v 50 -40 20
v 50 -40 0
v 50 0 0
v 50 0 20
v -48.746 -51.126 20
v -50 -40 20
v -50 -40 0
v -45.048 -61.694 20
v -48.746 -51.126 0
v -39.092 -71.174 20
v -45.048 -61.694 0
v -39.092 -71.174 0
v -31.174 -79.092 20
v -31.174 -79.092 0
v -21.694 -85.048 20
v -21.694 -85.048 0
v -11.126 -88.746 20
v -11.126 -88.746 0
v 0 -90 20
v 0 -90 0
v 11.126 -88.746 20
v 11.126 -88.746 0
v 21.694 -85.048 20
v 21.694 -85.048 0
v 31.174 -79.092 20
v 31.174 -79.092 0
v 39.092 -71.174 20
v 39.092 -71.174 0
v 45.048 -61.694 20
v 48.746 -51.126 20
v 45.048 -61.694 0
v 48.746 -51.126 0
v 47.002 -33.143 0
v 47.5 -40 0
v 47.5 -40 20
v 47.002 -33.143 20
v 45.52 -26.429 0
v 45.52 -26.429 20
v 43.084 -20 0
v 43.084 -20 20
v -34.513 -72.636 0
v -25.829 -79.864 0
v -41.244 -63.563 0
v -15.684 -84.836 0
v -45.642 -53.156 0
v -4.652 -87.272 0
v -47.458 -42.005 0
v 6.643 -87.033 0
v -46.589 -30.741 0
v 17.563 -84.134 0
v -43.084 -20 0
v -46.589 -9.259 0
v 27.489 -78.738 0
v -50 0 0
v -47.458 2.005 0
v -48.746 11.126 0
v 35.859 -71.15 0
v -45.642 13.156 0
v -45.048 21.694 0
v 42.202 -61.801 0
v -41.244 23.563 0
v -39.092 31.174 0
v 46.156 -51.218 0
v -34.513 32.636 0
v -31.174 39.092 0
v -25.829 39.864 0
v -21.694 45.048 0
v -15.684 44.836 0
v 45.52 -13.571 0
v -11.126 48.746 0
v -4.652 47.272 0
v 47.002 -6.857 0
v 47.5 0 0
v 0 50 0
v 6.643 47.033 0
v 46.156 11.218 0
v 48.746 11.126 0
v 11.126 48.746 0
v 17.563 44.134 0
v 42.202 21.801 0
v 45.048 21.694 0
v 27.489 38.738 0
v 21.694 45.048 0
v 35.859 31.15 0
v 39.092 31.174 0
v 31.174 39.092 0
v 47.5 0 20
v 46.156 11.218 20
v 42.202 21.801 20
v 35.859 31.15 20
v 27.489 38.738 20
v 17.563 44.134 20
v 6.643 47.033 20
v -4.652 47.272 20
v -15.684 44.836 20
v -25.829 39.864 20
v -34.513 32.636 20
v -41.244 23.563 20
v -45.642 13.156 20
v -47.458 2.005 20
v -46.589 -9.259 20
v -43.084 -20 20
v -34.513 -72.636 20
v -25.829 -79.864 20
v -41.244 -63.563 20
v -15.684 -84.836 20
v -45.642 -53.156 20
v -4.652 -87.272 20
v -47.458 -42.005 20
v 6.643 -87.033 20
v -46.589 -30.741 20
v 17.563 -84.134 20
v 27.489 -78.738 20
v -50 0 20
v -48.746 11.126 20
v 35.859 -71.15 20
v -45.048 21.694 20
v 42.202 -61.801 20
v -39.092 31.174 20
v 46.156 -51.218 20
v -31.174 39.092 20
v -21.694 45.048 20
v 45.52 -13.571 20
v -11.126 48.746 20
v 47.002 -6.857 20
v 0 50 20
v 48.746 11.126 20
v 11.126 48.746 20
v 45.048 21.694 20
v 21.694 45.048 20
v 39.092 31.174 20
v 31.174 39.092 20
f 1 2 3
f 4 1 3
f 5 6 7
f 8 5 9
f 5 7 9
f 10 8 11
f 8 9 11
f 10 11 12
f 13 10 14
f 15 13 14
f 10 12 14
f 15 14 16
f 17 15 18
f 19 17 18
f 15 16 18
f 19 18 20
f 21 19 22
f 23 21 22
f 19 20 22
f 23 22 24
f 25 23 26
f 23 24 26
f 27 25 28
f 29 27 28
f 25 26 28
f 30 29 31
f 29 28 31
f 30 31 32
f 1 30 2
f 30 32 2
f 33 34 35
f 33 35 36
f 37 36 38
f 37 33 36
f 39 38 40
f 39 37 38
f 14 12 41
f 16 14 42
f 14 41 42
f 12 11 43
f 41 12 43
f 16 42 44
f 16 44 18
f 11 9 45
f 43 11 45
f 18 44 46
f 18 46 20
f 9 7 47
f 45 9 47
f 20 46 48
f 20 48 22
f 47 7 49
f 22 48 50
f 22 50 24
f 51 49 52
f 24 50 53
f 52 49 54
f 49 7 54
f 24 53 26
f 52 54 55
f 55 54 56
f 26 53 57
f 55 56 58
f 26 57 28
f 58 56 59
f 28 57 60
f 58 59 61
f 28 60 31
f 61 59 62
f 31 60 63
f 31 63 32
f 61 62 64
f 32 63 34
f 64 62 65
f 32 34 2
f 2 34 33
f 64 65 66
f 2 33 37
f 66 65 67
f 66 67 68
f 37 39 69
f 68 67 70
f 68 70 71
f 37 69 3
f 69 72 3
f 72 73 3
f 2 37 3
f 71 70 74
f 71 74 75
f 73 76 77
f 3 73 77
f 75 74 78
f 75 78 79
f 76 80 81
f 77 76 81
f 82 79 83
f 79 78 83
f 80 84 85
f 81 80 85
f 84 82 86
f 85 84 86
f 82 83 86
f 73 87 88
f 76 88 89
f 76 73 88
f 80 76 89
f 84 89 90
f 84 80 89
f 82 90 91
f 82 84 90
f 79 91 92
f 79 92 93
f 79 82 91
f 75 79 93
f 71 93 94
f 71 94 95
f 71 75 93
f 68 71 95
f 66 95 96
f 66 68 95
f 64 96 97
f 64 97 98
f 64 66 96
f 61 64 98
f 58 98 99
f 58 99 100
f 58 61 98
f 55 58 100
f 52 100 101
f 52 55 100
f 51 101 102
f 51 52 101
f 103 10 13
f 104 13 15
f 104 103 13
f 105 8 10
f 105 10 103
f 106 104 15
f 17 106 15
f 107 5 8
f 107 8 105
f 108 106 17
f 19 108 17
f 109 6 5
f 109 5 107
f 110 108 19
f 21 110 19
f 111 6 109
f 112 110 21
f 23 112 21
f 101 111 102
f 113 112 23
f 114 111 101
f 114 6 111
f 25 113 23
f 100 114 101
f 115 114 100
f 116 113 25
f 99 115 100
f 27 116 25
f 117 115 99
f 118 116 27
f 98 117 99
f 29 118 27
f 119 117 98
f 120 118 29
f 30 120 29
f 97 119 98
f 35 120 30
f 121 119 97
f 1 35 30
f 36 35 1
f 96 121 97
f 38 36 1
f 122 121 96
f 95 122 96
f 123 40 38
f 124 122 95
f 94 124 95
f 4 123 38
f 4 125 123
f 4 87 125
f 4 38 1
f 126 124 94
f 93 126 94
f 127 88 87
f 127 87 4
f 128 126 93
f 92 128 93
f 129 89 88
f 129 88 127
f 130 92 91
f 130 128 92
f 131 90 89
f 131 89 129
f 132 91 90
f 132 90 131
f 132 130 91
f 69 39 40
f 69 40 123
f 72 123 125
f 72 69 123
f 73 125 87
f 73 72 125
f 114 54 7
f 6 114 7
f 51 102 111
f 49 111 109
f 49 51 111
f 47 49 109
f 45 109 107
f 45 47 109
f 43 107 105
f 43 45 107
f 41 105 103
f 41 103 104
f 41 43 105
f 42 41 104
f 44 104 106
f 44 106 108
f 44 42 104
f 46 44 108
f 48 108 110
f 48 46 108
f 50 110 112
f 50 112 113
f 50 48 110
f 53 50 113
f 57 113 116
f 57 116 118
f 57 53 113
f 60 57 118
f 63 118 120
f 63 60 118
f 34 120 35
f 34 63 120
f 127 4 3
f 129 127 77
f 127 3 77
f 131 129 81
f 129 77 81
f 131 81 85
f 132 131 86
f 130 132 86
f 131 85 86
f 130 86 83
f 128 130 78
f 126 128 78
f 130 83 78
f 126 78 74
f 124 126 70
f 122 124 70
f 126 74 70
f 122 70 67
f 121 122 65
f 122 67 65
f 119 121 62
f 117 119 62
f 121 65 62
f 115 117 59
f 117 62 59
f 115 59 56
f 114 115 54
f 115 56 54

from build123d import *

# Parameters (mm, degrees)
F2_DEPTH = 20
F3_DEPTH = 20
F4_DEPTH = 20


with BuildPart() as f2:
    # F1 (on Top) → F2 (new body)
    with BuildSketch(Plane.XY):
        with BuildLine():
            ThreePointArc((-45.8257569496, -20), (0, -50), (45.8257569496, -20))
            ThreePointArc((45.8257569496, -20), (0, 10), (-45.8257569496, -20))
        make_face()
    extrude(amount=F2_DEPTH)

    # F1 (on Top) → F3 (join)
    with BuildSketch(Plane.XY):
        with BuildLine():
            ThreePointArc((45.8257569496, -20), (48.9453156465, -10.2154821845), (50, 0))
            ThreePointArc((50, 0), (0, 50), (-50, 0))
            ThreePointArc((-50, 0), (-48.9453156465, -10.2154821845), (-45.8257569496, -20))
            ThreePointArc((-45.8257569496, -20), (0, 10), (45.8257569496, -20))
        make_face()
        with BuildLine():
            Line((50, -40), (50, 0))
            ThreePointArc((50, 0), (48.9453156465, -10.2154821845), (45.8257569496, -20))
            ThreePointArc((45.8257569496, -20), (48.9453156465, -29.7845178155), (50, -40))
        make_face()
        with BuildLine():
            ThreePointArc((-45.8257569496, -20), (-48.9453156465, -10.2154821845), (-50, 0))
            Line((-50, 0), (-50, -40))
            ThreePointArc((-50, -40), (-48.9453156465, -29.7845178155), (-45.8257569496, -20))
        make_face()
        with BuildLine():
            ThreePointArc((50, -40), (48.9453156465, -29.7845178155), (45.8257569496, -20))
            ThreePointArc((45.8257569496, -20), (0, -50), (-45.8257569496, -20))
            ThreePointArc((-45.8257569496, -20), (-48.9453156465, -29.7845178155), (-50, -40))
            ThreePointArc((-50, -40), (0, -90), (50, -40))
        make_face()
    extrude(amount=F3_DEPTH)

    # F0 (on Top) → F4 (cut)
    with BuildSketch(Plane.XY):
        with BuildLine():
            ThreePointArc((43.084219849, -20), (46.3829195008, -10.2408387638), (47.5, 0))
            ThreePointArc((47.5, 0), (-10.2408387638, 46.3829195008), (-43.084219849, -20))
            ThreePointArc((-43.084219849, -20), (0, 7.5), (43.084219849, -20))
        make_face()
        with BuildLine():
            ThreePointArc((43.084219849, -20), (0, 7.5), (-43.084219849, -20))
            ThreePointArc((-43.084219849, -20), (0, -47.5), (43.084219849, -20))
        make_face()
        with BuildLine():
            ThreePointArc((43.084219849, -20), (0, -47.5), (-43.084219849, -20))
            ThreePointArc((-43.084219849, -20), (-10.2408387638, -86.3829195008), (47.5, -40))
            ThreePointArc((47.5, -40), (46.3829195008, -29.7591612362), (43.084219849, -20))
        make_face()
    extrude(amount=F4_DEPTH, mode=Mode.SUBTRACT)


solid = f2.part
